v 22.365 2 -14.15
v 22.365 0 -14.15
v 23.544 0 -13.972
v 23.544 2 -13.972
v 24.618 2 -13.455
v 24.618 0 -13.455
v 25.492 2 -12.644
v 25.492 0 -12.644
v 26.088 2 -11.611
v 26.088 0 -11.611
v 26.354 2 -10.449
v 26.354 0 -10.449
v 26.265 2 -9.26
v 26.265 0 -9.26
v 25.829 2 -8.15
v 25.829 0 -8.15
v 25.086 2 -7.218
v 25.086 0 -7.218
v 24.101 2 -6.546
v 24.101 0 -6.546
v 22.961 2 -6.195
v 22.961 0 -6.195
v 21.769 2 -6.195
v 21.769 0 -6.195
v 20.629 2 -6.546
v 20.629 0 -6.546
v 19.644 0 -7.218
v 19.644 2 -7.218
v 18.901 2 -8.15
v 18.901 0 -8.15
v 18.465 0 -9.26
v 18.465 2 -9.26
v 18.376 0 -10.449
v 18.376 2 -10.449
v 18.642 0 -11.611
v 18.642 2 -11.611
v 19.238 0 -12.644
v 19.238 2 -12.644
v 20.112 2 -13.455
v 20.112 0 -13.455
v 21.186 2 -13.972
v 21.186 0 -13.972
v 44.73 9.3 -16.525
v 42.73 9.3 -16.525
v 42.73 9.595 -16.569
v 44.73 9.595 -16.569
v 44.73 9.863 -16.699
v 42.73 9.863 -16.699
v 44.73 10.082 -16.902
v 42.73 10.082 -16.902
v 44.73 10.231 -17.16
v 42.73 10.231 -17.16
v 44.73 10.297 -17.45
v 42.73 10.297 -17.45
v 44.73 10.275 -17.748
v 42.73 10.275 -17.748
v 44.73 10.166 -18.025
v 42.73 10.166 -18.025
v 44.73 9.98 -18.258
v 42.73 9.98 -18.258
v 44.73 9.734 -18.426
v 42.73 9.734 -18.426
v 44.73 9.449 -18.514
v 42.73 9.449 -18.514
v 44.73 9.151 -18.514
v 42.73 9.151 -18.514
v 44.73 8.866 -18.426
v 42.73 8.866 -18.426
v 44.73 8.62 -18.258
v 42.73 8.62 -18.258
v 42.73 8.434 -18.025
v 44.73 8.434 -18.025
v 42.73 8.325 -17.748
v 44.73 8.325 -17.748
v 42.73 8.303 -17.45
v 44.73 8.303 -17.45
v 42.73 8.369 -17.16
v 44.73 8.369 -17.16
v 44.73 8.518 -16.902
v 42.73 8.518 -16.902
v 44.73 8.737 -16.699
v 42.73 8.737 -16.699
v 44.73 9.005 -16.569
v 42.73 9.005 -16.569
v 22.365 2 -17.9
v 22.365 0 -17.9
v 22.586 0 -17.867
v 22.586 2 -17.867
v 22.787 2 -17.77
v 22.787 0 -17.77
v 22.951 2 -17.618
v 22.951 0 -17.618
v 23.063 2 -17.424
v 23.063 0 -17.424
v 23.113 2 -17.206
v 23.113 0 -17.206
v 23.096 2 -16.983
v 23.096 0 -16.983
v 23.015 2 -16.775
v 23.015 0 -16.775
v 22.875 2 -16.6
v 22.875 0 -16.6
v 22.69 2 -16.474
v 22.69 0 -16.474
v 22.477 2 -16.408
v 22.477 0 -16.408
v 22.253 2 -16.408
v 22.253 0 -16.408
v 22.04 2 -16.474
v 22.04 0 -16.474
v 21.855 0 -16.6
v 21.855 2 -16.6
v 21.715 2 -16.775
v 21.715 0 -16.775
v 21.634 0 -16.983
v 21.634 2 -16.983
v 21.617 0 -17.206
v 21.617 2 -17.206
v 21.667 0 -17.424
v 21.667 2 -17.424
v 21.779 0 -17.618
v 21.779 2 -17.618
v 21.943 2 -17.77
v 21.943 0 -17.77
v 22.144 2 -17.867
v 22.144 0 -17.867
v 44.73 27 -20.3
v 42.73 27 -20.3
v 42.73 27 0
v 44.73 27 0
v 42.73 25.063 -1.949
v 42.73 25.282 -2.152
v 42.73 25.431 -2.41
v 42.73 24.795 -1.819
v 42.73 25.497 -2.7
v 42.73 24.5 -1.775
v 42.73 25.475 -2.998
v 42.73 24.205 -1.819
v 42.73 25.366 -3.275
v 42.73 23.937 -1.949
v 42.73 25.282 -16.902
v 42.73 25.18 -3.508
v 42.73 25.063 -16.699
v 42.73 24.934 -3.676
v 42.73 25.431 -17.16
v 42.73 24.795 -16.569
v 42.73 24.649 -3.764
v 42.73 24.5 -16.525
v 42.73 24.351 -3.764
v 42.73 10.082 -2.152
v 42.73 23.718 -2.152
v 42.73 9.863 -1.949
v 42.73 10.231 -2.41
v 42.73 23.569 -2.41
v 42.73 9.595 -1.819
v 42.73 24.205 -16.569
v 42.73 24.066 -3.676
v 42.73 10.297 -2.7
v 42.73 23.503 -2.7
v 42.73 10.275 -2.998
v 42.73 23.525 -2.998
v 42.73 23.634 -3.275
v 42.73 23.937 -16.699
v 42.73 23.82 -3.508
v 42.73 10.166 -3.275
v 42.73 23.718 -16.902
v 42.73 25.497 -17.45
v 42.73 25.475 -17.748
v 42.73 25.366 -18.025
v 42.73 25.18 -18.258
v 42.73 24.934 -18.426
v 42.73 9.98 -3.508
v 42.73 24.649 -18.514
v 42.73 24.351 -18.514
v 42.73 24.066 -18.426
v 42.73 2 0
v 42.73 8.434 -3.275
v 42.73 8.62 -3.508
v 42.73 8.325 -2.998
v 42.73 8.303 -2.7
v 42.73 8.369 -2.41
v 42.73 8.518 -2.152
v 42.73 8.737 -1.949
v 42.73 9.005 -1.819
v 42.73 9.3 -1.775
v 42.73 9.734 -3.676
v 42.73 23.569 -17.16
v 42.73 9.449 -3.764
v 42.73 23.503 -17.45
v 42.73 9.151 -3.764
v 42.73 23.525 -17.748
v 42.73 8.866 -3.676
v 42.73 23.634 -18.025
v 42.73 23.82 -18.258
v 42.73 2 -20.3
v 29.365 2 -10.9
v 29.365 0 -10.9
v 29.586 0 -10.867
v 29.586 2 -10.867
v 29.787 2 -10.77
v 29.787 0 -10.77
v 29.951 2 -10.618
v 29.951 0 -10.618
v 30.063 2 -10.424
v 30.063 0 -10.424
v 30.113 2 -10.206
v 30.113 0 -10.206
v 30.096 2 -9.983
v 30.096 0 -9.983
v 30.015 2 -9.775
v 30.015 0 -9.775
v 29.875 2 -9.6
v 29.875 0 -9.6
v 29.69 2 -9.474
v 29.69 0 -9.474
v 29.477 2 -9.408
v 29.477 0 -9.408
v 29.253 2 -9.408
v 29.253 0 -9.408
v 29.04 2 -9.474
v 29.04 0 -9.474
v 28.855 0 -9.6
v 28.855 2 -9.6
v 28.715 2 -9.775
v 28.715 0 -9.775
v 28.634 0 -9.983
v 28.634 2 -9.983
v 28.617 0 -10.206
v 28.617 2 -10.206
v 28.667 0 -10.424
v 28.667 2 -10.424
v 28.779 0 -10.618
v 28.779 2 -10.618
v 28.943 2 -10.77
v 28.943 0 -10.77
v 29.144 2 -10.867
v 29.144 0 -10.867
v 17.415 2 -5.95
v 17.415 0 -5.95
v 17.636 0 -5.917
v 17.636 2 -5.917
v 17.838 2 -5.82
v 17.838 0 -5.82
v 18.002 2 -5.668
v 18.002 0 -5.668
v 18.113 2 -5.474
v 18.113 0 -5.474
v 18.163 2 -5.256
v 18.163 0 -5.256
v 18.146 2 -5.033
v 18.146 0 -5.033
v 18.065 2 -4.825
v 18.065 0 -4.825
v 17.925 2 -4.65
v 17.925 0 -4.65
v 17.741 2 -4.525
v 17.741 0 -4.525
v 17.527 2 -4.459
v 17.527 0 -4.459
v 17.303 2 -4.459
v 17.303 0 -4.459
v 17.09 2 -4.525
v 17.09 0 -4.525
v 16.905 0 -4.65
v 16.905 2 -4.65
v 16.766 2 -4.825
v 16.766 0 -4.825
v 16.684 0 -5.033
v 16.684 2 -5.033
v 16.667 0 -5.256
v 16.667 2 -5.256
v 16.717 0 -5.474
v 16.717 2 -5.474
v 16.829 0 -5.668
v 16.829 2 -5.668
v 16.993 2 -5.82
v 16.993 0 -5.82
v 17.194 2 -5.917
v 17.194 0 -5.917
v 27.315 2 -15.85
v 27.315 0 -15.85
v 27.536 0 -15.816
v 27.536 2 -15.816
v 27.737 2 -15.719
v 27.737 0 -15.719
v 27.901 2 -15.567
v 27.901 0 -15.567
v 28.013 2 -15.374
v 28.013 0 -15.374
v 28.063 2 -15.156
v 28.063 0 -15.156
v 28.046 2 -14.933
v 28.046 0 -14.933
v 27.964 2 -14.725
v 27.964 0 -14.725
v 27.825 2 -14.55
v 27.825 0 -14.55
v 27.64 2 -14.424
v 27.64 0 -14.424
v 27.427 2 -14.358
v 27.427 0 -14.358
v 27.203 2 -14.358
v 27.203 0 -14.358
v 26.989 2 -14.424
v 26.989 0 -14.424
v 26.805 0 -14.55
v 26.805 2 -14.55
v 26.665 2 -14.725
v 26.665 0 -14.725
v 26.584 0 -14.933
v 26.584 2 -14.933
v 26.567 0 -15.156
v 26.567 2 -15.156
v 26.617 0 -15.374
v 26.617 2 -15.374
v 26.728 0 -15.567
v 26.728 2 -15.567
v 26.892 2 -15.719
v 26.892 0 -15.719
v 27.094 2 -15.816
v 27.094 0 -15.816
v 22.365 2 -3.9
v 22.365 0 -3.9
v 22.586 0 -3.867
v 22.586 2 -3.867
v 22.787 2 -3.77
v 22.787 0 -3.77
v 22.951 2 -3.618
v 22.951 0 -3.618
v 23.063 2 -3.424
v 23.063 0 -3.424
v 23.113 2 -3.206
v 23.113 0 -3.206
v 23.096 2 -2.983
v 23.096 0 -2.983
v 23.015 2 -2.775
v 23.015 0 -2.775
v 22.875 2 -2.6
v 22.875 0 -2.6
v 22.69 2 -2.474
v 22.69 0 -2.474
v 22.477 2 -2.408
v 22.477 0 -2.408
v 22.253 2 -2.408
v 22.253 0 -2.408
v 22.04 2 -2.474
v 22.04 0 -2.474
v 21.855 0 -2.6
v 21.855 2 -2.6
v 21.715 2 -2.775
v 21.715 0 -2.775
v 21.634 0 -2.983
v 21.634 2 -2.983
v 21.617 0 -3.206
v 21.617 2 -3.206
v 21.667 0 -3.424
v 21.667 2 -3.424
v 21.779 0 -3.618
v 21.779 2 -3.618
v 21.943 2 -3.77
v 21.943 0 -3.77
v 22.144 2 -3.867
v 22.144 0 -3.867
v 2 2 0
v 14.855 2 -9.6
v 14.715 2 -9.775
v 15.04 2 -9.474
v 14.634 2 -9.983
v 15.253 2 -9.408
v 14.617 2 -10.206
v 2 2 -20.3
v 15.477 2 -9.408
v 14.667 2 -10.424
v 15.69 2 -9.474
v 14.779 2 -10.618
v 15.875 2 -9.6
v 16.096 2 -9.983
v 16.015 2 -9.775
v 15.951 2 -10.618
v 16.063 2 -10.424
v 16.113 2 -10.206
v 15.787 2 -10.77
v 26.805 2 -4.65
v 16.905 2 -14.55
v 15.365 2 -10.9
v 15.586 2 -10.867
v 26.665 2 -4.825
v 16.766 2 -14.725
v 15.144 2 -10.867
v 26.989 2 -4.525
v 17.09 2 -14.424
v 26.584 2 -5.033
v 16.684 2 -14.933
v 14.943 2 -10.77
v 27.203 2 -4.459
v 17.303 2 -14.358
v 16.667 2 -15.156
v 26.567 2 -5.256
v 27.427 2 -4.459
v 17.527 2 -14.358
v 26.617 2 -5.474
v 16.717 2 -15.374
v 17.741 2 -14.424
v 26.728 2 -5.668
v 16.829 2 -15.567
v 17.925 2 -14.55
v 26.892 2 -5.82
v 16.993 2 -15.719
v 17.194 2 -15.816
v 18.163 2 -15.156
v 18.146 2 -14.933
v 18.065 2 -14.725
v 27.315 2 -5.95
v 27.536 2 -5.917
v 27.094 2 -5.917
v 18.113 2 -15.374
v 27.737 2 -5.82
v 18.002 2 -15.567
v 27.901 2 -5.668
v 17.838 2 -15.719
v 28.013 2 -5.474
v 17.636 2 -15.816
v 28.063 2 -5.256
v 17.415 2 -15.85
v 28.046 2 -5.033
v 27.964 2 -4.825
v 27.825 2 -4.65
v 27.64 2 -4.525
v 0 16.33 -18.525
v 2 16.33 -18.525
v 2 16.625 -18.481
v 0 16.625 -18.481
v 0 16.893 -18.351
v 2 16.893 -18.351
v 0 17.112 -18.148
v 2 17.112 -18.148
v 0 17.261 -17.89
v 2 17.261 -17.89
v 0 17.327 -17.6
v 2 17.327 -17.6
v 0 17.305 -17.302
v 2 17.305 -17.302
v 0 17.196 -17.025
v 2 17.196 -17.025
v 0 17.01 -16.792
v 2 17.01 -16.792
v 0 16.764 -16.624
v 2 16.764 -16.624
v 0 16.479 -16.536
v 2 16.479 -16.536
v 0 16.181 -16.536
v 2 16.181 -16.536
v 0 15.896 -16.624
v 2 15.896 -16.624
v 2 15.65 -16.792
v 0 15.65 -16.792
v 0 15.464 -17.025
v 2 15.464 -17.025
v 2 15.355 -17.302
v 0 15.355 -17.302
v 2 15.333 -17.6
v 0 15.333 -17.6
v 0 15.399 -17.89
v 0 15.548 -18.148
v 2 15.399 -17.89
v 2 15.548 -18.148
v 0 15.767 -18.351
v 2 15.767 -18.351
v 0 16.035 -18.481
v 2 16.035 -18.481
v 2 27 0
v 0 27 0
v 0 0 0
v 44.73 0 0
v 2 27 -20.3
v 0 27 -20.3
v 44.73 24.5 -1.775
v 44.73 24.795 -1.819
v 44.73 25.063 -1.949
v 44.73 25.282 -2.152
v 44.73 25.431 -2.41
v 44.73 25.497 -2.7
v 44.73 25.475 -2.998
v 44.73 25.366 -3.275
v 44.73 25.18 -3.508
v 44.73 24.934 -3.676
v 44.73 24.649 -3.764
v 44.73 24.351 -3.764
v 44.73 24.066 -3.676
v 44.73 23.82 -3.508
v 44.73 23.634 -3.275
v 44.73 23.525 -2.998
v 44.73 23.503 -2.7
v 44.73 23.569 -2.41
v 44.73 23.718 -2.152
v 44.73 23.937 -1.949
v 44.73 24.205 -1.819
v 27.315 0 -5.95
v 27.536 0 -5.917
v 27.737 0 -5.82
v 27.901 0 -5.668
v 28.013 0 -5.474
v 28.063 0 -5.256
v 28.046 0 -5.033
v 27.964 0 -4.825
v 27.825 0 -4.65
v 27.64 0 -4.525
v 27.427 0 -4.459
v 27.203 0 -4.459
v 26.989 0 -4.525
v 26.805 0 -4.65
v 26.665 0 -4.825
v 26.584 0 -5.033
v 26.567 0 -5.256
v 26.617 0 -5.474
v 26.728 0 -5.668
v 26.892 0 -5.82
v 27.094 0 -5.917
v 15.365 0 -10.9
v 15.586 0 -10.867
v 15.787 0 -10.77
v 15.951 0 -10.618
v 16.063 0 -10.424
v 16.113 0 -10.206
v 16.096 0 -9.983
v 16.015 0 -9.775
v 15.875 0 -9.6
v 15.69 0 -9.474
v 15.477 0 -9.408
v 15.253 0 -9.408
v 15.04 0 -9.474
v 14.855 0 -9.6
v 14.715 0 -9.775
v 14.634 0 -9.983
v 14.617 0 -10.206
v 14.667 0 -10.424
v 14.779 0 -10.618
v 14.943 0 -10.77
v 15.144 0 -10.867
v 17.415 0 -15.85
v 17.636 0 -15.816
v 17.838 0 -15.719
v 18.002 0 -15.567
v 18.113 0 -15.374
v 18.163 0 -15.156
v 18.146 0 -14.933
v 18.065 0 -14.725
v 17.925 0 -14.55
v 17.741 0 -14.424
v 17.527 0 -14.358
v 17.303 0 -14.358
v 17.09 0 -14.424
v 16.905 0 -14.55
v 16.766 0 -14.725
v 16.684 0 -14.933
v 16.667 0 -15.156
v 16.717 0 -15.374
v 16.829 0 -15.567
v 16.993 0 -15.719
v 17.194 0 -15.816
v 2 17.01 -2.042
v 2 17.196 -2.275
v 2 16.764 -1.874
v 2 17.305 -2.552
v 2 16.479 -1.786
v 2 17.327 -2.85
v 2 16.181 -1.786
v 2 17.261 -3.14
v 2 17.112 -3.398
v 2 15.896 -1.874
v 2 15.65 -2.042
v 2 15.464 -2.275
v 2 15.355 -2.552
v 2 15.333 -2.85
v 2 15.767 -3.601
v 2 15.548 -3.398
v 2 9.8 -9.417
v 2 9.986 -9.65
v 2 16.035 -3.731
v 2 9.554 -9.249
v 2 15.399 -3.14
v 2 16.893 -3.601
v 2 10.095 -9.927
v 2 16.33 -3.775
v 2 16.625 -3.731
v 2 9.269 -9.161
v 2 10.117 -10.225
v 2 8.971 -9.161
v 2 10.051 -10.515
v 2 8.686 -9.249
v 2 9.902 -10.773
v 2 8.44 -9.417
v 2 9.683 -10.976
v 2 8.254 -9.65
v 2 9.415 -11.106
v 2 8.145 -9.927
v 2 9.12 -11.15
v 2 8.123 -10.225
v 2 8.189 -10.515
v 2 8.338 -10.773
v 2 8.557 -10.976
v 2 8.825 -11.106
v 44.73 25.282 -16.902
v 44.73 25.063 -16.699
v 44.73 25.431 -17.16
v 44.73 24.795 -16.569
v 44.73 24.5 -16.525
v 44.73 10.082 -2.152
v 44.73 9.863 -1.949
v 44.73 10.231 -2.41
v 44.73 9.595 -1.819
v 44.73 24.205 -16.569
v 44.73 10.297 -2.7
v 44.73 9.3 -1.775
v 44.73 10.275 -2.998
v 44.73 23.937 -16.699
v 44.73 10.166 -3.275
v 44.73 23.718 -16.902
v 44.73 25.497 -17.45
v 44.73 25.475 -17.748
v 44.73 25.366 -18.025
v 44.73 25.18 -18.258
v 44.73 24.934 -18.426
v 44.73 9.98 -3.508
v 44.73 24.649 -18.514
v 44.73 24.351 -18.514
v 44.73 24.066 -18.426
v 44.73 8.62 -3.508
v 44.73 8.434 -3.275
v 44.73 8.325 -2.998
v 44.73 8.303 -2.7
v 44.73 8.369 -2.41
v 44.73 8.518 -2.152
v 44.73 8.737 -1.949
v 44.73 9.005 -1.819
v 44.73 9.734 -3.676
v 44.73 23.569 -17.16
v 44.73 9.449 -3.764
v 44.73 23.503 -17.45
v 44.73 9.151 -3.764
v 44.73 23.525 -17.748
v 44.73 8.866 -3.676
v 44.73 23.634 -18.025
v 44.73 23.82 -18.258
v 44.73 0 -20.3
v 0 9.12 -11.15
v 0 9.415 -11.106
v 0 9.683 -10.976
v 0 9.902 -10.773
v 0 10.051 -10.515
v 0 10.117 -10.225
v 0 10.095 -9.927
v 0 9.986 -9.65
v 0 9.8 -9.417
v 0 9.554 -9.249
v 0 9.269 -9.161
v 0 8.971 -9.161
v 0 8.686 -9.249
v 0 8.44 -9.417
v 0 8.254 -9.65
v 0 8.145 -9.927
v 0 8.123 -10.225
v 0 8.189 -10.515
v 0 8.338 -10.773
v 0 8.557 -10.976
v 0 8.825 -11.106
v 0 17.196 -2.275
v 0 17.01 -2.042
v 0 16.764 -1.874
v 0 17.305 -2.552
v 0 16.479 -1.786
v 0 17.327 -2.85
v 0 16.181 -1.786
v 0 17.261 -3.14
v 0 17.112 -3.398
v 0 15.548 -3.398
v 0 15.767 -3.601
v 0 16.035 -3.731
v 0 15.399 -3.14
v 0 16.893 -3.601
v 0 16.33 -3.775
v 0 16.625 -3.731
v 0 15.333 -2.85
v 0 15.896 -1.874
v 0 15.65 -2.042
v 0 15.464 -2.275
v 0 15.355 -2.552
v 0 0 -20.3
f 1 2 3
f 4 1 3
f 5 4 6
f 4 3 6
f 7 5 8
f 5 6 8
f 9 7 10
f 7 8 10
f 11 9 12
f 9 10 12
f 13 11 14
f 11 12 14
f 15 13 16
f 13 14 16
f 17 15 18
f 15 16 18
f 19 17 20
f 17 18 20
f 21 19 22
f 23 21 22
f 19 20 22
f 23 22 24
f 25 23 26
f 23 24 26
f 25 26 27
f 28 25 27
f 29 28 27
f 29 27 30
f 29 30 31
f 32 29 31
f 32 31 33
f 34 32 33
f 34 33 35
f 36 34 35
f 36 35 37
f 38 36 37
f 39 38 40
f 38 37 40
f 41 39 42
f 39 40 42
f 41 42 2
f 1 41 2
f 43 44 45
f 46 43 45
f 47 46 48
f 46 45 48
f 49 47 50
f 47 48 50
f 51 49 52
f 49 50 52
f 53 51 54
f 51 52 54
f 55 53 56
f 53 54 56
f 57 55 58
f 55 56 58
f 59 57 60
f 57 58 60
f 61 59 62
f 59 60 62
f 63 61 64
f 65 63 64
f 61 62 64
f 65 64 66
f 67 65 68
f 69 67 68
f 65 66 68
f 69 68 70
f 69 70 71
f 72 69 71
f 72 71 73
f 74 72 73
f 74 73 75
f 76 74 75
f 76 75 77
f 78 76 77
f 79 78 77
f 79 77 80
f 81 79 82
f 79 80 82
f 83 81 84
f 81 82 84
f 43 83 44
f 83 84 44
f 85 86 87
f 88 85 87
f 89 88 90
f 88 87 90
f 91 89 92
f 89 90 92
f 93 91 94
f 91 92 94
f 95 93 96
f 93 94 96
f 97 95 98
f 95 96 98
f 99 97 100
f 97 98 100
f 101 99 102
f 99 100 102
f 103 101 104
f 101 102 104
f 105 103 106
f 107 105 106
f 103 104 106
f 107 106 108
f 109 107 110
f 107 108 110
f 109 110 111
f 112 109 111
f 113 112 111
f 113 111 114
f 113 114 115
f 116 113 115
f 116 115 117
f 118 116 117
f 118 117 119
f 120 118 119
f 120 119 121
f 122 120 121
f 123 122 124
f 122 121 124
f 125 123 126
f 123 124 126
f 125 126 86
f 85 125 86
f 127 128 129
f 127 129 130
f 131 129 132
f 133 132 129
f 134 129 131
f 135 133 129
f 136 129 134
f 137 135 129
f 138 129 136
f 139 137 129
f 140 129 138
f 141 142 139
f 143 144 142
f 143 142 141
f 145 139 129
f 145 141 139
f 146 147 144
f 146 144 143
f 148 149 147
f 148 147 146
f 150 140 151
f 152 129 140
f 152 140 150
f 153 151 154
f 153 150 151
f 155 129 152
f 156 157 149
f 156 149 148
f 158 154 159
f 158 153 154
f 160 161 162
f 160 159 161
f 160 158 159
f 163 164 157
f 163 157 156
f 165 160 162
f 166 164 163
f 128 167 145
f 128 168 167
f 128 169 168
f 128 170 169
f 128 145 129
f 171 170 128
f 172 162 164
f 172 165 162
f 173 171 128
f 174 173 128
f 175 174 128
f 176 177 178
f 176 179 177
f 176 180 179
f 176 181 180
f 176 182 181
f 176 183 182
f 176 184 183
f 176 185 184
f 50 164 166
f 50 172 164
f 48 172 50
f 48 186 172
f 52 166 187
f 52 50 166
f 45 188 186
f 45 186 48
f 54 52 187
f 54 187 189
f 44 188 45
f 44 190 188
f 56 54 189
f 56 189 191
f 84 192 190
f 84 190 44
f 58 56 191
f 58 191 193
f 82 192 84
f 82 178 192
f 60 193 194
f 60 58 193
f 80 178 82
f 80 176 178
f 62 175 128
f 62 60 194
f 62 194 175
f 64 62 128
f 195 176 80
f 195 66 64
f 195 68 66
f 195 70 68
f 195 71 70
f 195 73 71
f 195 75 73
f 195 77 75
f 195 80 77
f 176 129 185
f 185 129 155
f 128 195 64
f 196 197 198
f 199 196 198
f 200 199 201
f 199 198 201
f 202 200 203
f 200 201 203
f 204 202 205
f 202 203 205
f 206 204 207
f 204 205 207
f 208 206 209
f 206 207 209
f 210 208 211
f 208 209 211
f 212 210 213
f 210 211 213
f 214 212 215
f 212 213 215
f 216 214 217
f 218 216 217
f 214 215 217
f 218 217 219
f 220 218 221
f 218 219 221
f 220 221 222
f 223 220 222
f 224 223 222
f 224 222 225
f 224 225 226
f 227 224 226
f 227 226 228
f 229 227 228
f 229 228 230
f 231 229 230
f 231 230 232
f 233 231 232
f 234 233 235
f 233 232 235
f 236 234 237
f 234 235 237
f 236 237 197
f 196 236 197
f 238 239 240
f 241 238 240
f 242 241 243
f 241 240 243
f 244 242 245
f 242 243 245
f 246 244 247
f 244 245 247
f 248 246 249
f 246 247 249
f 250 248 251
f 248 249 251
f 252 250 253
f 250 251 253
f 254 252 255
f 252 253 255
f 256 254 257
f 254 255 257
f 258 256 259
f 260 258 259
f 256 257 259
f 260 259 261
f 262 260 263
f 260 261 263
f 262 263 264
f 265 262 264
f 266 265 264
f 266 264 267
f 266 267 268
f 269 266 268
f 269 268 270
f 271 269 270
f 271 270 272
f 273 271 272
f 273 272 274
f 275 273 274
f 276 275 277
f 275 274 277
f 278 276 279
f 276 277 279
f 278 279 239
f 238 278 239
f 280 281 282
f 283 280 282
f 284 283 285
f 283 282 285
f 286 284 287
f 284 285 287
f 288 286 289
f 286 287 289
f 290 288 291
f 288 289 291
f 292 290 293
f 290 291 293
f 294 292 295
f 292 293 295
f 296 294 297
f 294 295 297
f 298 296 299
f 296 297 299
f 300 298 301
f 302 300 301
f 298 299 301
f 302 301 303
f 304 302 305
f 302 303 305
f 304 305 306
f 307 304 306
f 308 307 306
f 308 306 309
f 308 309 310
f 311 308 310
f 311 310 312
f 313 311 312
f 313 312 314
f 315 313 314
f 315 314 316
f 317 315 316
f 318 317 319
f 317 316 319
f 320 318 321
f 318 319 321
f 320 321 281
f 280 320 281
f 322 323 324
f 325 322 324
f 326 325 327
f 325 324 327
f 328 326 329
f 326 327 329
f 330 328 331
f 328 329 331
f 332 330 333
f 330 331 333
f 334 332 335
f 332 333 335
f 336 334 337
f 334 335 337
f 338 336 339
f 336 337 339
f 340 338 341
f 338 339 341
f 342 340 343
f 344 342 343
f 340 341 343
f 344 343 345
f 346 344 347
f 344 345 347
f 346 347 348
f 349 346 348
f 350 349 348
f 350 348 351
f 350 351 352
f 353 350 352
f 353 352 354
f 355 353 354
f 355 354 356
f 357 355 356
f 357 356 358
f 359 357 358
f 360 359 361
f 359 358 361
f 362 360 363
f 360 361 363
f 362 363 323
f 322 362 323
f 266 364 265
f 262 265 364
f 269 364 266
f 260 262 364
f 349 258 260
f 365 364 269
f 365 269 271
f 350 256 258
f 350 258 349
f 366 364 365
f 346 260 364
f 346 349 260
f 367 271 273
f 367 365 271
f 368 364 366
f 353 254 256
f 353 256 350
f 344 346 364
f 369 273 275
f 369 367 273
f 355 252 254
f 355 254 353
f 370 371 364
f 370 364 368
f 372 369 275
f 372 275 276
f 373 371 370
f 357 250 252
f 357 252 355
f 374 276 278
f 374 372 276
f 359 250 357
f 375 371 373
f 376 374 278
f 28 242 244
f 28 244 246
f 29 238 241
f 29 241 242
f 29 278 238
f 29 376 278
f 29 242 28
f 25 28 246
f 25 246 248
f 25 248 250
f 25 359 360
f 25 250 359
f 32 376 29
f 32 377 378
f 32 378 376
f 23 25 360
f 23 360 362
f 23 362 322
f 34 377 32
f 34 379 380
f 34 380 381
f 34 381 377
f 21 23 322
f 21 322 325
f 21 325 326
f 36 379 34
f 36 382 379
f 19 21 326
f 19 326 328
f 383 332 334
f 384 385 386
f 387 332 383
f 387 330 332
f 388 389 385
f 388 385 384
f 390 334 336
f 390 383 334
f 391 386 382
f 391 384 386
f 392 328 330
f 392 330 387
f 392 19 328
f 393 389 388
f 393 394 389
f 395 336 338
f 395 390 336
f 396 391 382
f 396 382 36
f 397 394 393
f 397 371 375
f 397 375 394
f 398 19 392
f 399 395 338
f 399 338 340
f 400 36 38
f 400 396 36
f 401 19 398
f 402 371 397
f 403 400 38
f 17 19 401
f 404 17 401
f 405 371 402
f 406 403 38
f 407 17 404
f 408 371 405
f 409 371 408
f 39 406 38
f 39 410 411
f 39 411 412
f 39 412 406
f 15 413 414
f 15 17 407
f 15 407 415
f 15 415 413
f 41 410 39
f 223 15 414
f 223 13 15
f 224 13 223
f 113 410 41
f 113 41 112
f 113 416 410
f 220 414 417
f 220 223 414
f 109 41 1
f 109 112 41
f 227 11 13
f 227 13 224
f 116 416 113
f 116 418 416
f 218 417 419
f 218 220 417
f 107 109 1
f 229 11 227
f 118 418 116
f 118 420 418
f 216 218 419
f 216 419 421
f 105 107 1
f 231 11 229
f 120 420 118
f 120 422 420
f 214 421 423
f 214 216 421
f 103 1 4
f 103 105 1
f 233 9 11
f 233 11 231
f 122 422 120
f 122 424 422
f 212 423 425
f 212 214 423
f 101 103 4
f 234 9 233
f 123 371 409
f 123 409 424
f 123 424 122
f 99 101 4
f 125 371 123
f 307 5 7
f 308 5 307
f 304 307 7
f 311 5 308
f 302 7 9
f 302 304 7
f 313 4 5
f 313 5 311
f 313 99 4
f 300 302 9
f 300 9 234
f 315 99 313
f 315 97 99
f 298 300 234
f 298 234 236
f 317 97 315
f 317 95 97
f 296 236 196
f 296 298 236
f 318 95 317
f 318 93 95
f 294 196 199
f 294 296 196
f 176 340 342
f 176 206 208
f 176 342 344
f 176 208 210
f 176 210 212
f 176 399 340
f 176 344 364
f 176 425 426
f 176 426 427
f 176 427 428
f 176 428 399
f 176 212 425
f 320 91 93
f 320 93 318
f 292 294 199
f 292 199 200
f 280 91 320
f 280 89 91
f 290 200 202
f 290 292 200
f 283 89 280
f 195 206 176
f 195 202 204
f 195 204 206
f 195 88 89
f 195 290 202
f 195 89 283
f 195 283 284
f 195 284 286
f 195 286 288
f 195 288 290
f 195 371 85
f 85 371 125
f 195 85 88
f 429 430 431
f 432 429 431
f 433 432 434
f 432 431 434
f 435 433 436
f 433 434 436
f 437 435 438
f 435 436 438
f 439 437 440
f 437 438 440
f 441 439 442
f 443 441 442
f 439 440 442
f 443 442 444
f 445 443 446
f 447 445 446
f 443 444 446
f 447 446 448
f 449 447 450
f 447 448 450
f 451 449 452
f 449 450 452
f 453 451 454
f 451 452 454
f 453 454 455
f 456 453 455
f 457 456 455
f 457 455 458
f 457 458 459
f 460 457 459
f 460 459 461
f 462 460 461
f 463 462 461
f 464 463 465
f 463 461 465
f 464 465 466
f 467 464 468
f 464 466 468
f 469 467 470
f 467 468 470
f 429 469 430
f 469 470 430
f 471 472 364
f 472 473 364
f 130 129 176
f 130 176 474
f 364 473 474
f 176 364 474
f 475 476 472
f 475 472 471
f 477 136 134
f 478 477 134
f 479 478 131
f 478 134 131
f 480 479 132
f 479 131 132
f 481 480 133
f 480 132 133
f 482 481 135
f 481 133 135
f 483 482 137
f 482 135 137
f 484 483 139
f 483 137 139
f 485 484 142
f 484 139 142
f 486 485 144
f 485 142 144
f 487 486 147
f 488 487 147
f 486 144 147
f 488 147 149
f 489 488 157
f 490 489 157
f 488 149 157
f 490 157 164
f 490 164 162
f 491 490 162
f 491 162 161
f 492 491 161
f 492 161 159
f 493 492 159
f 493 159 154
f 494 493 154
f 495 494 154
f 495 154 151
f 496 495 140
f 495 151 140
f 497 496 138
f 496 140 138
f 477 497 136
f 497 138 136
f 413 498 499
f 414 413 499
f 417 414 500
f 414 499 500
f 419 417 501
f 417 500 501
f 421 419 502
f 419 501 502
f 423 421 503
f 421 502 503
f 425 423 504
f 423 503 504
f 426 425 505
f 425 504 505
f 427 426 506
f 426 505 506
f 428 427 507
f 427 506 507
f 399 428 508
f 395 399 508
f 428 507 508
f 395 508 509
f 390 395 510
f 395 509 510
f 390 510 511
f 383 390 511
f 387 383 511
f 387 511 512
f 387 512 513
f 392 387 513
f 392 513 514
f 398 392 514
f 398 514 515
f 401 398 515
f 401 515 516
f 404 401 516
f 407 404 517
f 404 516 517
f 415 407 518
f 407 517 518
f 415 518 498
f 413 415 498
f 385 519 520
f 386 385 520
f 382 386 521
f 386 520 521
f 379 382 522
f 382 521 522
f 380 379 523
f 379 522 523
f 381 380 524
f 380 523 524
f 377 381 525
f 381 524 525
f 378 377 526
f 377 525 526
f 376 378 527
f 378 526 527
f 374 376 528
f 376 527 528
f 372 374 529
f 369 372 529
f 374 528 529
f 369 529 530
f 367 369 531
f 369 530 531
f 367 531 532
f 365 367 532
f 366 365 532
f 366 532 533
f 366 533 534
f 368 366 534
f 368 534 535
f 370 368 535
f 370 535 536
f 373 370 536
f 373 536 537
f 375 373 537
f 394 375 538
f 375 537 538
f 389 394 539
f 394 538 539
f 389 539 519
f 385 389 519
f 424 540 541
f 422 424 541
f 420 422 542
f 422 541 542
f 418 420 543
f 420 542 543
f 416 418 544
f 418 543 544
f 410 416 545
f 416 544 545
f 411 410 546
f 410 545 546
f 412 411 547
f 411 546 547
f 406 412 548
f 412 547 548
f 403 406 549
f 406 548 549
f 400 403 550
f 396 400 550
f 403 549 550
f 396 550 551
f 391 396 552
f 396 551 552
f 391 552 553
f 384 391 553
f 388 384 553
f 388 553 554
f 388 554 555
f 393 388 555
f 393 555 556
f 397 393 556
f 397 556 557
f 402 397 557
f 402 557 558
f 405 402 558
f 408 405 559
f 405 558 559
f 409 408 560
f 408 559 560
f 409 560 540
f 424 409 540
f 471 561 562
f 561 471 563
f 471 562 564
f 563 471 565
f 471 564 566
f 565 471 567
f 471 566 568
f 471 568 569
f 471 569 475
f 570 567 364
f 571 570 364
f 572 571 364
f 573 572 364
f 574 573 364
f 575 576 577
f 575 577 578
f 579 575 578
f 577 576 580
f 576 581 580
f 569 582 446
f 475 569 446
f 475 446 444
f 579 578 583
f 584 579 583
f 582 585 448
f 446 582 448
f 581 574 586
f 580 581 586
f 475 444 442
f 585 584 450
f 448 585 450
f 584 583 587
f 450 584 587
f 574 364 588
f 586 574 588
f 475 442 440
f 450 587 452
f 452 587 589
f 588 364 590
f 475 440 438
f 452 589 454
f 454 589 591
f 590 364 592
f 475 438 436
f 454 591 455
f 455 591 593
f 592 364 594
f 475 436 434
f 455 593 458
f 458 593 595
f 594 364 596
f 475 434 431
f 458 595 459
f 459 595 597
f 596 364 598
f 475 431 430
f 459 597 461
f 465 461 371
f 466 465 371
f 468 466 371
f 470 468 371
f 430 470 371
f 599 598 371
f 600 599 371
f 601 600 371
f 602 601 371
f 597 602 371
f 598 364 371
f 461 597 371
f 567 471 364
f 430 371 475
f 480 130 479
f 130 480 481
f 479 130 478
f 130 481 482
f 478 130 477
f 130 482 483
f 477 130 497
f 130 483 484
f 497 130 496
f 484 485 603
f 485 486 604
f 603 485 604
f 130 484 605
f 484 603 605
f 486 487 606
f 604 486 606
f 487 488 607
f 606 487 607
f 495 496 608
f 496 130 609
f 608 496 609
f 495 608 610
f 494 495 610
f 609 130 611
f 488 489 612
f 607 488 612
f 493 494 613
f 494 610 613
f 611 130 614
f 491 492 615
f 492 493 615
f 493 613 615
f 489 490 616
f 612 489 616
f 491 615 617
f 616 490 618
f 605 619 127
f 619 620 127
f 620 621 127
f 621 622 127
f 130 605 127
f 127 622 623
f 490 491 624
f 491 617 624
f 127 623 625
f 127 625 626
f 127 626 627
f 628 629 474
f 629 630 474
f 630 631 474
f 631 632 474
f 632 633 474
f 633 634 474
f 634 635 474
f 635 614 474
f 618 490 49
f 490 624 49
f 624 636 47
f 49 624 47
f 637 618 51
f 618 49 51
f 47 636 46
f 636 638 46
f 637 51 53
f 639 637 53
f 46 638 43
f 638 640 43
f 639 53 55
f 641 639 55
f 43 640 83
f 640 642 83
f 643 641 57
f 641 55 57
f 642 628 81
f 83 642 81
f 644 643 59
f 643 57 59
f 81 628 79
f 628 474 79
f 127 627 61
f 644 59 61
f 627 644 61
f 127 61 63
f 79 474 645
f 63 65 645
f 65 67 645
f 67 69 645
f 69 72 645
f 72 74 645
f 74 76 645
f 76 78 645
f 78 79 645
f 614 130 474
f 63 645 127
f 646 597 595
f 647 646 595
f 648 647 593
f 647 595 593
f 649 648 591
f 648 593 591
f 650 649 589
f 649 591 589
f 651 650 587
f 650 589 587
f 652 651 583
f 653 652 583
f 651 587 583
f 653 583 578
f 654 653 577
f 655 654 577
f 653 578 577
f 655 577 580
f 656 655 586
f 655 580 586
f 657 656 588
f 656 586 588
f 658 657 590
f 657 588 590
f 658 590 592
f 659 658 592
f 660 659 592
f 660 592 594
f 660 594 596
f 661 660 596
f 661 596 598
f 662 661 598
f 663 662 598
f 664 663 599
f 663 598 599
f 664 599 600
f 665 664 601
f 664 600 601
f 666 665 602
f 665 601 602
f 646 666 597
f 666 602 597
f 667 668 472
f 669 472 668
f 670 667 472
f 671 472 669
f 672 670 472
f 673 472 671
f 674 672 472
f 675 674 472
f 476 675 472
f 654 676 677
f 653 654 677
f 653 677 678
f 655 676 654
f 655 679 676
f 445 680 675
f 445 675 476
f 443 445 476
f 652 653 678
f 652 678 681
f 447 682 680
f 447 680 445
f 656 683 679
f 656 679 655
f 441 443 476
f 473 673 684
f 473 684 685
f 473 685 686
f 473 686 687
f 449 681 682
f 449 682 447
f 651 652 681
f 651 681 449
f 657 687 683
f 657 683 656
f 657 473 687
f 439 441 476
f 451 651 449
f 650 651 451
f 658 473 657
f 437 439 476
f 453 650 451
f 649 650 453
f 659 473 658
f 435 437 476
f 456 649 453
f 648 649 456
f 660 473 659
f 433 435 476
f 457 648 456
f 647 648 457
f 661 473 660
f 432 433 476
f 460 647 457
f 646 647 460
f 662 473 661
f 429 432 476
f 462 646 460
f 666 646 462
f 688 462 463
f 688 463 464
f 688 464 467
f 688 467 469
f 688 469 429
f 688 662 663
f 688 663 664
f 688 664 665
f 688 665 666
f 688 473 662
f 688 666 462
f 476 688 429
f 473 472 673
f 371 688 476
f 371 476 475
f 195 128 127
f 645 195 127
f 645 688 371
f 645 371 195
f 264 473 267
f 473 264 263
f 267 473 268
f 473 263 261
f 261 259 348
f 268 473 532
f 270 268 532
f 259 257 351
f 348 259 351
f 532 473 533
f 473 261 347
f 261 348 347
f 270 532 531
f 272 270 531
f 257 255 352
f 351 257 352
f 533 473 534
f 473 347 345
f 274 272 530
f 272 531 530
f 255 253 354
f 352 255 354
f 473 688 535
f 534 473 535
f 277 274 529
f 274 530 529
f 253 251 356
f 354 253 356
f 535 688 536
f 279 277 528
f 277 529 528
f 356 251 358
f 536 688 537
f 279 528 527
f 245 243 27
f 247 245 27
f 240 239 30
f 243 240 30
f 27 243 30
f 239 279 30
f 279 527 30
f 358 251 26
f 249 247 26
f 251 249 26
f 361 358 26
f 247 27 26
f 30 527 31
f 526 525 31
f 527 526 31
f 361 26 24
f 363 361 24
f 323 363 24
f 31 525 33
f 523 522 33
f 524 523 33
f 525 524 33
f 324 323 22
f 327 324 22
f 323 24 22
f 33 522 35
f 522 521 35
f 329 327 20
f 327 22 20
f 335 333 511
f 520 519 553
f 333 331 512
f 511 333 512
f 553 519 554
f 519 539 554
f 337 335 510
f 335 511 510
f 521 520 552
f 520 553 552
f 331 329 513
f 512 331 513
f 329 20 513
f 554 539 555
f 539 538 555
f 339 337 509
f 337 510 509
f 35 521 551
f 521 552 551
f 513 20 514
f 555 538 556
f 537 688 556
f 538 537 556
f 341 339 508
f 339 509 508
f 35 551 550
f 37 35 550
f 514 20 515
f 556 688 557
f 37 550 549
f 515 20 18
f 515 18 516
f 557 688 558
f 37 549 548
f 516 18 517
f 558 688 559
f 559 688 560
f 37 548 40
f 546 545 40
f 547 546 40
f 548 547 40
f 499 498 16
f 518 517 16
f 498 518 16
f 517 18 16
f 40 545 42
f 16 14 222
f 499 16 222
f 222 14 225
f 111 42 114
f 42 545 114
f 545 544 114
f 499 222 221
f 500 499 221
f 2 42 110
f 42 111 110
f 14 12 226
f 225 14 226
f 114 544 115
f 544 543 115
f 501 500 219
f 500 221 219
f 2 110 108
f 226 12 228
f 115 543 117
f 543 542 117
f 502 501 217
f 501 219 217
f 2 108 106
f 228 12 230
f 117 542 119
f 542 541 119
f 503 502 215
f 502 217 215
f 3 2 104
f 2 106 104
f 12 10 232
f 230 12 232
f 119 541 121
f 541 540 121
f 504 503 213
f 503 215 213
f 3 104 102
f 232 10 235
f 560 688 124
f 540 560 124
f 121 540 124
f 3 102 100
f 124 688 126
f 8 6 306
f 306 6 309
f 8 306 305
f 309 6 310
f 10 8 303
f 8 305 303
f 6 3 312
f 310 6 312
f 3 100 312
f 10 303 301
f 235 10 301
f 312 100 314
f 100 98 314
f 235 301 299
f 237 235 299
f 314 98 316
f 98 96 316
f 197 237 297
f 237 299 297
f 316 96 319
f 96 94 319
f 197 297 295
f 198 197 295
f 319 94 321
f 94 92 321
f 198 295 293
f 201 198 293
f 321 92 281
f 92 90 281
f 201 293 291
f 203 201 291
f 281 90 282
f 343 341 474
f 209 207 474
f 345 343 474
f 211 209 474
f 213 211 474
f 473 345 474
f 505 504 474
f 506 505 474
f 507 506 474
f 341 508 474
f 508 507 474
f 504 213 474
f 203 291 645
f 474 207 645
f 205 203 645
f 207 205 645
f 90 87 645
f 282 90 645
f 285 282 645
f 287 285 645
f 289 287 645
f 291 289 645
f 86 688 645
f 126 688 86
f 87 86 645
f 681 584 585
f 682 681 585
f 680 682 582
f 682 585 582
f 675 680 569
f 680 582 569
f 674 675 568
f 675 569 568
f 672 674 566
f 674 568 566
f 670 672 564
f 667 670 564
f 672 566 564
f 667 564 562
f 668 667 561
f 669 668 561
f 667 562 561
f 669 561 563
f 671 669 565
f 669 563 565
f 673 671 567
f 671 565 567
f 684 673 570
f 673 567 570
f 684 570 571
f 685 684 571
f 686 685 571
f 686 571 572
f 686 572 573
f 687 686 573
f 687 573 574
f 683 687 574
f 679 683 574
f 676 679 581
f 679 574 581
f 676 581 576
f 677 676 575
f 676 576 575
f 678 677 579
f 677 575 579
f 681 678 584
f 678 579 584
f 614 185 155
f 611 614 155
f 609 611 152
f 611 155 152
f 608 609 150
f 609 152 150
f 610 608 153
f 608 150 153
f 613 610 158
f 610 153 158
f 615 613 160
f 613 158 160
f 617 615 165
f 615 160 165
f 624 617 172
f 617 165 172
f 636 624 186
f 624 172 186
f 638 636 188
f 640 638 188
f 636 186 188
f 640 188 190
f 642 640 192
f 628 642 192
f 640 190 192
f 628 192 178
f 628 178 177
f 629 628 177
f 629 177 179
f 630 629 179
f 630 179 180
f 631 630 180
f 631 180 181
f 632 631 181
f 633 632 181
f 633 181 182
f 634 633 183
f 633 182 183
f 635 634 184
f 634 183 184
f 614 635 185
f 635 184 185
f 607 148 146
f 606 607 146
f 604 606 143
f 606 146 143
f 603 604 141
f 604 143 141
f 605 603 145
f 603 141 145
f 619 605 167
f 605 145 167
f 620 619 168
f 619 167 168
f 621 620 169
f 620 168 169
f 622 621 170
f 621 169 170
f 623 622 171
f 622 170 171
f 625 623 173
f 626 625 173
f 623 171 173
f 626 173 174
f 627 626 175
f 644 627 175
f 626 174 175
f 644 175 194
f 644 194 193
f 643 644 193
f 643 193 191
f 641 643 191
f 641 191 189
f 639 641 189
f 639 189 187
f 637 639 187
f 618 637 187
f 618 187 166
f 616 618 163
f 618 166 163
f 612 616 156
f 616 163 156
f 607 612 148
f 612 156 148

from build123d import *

# Parameters (mm, degrees)
SKETCH1_W               = 44.73
SKETCH1_H               = 20.3
YAWMOUNT_DEPTH          = 2
SKETCH2_W               = 2
SKETCH2_H               = 20.3
BODYCONNECTORS_DEPTH    = 25
SKETCH3_R               = 4
AXLE_COUNTERBORE_DEPTH  = 2
SKETCH5_R               = 0.75
AZEL_MOUNTSCREWS_DEPTH  = 2
SKETCH6_R               = 1
GEARSIDE_SCREWS_DEPTH   = 2
SKETCH7_R               = 1
SMOOTHSIDE_SCREWS_DEPTH = 2


with BuildPart() as part:
    # Sketch1 → YawMount (new body)
    with BuildSketch(Plane(origin=(0, 0, 0), x_dir=(1, 0, 0), z_dir=(0, 1, 0))):
        with Locations((22.365, 10.15)):
            Rectangle(SKETCH1_W, SKETCH1_H)
    extrude(amount=YAWMOUNT_DEPTH)

    # Sketch2 → BodyConnectors (add)
    with BuildSketch(Plane(origin=(0, 2, 0), x_dir=(1, 0, 0), z_dir=(0, 1, 0))):
        with Locations((1, 10.15)):
            Rectangle(SKETCH2_W, SKETCH2_H)
        with Locations((43.73, 10.15)):
            Rectangle(SKETCH2_W, SKETCH2_H)
    extrude(amount=BODYCONNECTORS_DEPTH)

    # Sketch3 → Axle-Counterbore (cut)
    with BuildSketch(Plane.XZ):
        with Locations(Location((22.365, -10.15, 0), (0, 0, 270))):
            Circle(SKETCH3_R)
    extrude(amount=-AXLE_COUNTERBORE_DEPTH, mode=Mode.SUBTRACT)

    # Sketch5 → azel-mountscrews (cut)
    with BuildSketch(Plane.XZ):
        with Locations(Location((15.365, -10.15, 0), (0, 0, 270))):
            Circle(SKETCH5_R)
        with Locations(Location((17.415252532, -5.200252532, 0), (0, 0, 270))):
            Circle(SKETCH5_R)
        with Locations(Location((22.365, -3.15, 0), (0, 0, 270))):
            Circle(SKETCH5_R)
        with Locations(Location((27.314747468, -5.200252532, 0), (0, 0, 270))):
            Circle(SKETCH5_R)
        with Locations(Location((29.365, -10.15, 0), (0, 0, 270))):
            Circle(SKETCH5_R)
        with Locations(Location((27.314747468, -15.099747468, 0), (0, 0, 270))):
            Circle(SKETCH5_R)
        with Locations(Location((22.365, -17.15, 0), (0, 0, 270))):
            Circle(SKETCH5_R)
        with Locations(Location((17.415252532, -15.099747468, 0), (0, 0, 270))):
            Circle(SKETCH5_R)
    extrude(amount=-AZEL_MOUNTSCREWS_DEPTH, mode=Mode.SUBTRACT)

    # Sketch6 → GearSide-Screws (cut)
    with BuildSketch(Plane(origin=(2, 0, 0), x_dir=(0, 0, -1), z_dir=(1, 0, 0))):
        with Locations((10.15, 9.12)):
            Circle(SKETCH6_R)
        with Locations((17.525, 16.33)):
            Circle(SKETCH6_R)
        with Locations((2.775, 16.33)):
            Circle(SKETCH6_R)
    extrude(amount=-GEARSIDE_SCREWS_DEPTH, mode=Mode.SUBTRACT)

    # Sketch7 → SmoothSide-Screws (cut)
    with BuildSketch(Plane.ZY.offset(-42.73)):
        with Locations((-2.775, 9.3)):
            Circle(SKETCH7_R)
        with Locations((-17.525, 9.3)):
            Circle(SKETCH7_R)
        with Locations((-17.525, 24.5)):
            Circle(SKETCH7_R)
        with Locations((-2.775, 24.5)):
            Circle(SKETCH7_R)
    extrude(amount=-SMOOTHSIDE_SCREWS_DEPTH, mode=Mode.SUBTRACT)


solid = part.part
